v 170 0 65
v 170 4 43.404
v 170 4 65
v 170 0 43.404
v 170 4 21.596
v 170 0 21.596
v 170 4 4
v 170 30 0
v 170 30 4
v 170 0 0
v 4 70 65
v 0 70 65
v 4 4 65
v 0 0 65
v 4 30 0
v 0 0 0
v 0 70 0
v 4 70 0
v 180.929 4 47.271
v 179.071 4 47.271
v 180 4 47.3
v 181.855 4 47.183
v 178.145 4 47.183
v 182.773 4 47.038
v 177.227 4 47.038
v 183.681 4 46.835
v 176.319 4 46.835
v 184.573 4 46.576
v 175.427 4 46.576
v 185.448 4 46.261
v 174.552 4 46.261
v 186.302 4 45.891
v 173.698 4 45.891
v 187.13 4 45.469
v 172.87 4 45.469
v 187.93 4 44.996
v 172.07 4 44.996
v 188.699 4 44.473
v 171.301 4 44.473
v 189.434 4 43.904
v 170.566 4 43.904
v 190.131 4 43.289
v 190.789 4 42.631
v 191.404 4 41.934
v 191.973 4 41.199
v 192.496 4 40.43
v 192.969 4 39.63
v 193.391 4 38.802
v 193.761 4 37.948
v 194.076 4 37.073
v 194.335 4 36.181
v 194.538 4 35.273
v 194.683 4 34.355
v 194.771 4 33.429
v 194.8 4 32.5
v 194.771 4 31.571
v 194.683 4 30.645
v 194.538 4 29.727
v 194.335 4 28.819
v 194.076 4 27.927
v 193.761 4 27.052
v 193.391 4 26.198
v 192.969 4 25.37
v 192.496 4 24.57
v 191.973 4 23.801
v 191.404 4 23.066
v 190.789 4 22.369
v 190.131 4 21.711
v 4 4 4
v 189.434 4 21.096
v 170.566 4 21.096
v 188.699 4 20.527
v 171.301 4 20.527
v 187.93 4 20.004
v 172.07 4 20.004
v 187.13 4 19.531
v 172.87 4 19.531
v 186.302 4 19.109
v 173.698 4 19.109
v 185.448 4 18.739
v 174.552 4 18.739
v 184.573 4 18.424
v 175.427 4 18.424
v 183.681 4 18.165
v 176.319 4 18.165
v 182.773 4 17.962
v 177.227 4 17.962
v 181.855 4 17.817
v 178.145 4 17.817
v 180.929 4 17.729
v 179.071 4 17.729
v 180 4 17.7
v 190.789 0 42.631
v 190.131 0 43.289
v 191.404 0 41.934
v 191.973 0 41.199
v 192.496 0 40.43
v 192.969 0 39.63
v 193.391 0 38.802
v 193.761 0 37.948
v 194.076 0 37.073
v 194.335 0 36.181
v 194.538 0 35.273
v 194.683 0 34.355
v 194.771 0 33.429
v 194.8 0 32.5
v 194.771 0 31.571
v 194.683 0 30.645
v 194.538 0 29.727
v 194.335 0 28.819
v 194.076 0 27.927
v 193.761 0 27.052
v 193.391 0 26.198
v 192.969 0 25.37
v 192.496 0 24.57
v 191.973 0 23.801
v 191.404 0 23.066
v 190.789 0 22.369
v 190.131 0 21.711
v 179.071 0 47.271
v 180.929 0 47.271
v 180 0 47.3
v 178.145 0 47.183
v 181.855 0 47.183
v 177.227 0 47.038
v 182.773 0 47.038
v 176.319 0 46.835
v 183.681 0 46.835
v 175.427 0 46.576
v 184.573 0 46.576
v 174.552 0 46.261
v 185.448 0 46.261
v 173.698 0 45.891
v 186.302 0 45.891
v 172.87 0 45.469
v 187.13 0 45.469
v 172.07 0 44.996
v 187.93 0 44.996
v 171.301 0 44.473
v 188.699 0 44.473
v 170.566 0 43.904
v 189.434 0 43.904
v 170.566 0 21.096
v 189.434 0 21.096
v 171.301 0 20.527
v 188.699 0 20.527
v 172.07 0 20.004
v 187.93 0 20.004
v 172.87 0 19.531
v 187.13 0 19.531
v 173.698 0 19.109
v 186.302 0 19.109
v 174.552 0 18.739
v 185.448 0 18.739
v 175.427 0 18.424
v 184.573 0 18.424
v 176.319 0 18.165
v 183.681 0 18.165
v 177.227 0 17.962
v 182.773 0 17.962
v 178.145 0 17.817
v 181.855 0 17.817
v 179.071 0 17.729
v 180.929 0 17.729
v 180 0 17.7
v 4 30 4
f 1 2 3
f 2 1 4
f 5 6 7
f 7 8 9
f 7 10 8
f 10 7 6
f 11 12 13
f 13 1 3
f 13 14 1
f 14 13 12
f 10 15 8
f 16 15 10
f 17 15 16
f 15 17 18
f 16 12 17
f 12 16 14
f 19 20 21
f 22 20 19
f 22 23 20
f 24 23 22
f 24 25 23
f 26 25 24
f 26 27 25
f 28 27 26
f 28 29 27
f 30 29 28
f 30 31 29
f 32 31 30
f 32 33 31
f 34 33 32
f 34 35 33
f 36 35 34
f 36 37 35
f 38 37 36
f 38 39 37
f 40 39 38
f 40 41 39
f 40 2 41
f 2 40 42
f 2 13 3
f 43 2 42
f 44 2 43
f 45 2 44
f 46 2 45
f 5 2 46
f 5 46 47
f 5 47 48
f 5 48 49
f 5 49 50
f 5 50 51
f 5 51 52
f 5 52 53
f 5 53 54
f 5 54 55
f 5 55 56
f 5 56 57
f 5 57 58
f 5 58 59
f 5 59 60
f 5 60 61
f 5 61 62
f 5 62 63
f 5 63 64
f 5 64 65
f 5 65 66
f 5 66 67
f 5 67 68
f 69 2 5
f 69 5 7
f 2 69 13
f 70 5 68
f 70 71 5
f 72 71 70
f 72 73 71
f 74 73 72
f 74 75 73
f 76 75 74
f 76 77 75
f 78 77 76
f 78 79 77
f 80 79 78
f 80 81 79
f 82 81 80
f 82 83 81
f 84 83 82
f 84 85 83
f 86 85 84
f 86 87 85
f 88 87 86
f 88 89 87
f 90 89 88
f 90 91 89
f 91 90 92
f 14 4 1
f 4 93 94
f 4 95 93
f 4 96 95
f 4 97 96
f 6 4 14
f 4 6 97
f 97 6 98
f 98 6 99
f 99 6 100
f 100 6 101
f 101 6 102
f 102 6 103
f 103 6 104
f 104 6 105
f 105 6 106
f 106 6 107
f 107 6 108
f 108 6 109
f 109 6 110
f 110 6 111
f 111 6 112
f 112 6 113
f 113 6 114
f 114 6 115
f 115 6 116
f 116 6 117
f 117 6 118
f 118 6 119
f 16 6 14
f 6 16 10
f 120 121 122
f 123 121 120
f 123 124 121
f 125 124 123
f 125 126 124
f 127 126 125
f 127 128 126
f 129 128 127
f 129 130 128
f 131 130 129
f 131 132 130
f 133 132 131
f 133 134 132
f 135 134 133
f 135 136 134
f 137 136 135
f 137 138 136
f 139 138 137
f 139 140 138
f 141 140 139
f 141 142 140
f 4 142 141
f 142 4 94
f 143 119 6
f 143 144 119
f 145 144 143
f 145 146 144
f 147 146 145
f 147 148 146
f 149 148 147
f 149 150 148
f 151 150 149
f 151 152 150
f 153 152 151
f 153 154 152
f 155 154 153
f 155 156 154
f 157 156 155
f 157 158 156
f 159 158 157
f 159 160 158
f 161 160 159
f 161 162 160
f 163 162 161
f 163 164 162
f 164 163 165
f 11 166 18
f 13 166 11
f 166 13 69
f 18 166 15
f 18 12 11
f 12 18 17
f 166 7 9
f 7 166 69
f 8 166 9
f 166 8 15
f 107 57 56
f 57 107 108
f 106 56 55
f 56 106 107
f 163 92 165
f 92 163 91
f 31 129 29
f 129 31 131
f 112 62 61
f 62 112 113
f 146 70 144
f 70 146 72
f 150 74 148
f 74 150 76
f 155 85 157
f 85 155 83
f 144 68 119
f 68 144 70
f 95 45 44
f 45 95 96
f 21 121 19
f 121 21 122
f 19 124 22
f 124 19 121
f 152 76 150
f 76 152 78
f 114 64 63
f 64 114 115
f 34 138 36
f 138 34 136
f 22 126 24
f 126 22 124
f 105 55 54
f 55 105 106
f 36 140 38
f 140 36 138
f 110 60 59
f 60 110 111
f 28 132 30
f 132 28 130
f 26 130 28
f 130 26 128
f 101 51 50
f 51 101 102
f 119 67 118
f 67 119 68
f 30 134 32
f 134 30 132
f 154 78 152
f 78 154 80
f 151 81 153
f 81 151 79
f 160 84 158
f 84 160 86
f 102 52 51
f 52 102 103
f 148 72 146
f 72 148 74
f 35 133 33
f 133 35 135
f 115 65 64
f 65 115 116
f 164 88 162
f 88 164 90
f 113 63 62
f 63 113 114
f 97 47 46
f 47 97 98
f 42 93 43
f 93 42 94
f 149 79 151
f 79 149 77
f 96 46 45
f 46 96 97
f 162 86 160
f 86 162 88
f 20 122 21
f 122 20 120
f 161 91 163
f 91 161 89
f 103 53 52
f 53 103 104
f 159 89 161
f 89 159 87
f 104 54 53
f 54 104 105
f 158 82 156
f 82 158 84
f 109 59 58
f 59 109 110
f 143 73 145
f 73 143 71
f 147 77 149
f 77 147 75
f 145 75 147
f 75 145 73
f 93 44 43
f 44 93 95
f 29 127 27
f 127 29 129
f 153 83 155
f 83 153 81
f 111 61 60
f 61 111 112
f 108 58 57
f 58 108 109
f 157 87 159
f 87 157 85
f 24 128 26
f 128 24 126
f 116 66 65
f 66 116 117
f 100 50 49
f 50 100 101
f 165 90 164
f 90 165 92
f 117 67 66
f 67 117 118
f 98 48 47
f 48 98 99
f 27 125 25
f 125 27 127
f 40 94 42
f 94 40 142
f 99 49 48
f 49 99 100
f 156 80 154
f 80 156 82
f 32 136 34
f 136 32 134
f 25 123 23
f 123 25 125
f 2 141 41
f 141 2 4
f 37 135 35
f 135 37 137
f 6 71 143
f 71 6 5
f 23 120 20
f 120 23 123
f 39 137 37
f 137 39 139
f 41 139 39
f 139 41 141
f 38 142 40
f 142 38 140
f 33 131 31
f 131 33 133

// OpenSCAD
// Daniel Seijas Iglesias  <seijasdeveloper@gmail.com>

$fn = 100;

macho = true;

//variables base
grosor = 4;
largo  = 170;
ancho  = 120-50;
altura = 65;

ancho_ruedas = 30;

radio_circulo = 15;
diferencia = 10;

difference(){
    union(){
        // Largo
        cube([largo, grosor, altura]);
        
        // lado derecho
        cube([grosor, ancho, altura]);
        
        // lado izquierdo
        *translate([largo, 0, 0])
        cube([grosor, ancho, altura]);
        
        // base ruedas
        cube([largo, ancho_ruedas, grosor]);
        
        if(macho){
        translate([largo+diferencia, 0, altura/2])
        rotate([-90, 0, 0])
            cylinder(r=radio_circulo-0.2, h=grosor);
        }
    }
    
    if(!macho){
    translate([largo-diferencia, -0.05, altura/2])
        rotate([-90, 0, 0])
            cylinder(r=radio_circulo, h=grosor+0.1);
    }
}
